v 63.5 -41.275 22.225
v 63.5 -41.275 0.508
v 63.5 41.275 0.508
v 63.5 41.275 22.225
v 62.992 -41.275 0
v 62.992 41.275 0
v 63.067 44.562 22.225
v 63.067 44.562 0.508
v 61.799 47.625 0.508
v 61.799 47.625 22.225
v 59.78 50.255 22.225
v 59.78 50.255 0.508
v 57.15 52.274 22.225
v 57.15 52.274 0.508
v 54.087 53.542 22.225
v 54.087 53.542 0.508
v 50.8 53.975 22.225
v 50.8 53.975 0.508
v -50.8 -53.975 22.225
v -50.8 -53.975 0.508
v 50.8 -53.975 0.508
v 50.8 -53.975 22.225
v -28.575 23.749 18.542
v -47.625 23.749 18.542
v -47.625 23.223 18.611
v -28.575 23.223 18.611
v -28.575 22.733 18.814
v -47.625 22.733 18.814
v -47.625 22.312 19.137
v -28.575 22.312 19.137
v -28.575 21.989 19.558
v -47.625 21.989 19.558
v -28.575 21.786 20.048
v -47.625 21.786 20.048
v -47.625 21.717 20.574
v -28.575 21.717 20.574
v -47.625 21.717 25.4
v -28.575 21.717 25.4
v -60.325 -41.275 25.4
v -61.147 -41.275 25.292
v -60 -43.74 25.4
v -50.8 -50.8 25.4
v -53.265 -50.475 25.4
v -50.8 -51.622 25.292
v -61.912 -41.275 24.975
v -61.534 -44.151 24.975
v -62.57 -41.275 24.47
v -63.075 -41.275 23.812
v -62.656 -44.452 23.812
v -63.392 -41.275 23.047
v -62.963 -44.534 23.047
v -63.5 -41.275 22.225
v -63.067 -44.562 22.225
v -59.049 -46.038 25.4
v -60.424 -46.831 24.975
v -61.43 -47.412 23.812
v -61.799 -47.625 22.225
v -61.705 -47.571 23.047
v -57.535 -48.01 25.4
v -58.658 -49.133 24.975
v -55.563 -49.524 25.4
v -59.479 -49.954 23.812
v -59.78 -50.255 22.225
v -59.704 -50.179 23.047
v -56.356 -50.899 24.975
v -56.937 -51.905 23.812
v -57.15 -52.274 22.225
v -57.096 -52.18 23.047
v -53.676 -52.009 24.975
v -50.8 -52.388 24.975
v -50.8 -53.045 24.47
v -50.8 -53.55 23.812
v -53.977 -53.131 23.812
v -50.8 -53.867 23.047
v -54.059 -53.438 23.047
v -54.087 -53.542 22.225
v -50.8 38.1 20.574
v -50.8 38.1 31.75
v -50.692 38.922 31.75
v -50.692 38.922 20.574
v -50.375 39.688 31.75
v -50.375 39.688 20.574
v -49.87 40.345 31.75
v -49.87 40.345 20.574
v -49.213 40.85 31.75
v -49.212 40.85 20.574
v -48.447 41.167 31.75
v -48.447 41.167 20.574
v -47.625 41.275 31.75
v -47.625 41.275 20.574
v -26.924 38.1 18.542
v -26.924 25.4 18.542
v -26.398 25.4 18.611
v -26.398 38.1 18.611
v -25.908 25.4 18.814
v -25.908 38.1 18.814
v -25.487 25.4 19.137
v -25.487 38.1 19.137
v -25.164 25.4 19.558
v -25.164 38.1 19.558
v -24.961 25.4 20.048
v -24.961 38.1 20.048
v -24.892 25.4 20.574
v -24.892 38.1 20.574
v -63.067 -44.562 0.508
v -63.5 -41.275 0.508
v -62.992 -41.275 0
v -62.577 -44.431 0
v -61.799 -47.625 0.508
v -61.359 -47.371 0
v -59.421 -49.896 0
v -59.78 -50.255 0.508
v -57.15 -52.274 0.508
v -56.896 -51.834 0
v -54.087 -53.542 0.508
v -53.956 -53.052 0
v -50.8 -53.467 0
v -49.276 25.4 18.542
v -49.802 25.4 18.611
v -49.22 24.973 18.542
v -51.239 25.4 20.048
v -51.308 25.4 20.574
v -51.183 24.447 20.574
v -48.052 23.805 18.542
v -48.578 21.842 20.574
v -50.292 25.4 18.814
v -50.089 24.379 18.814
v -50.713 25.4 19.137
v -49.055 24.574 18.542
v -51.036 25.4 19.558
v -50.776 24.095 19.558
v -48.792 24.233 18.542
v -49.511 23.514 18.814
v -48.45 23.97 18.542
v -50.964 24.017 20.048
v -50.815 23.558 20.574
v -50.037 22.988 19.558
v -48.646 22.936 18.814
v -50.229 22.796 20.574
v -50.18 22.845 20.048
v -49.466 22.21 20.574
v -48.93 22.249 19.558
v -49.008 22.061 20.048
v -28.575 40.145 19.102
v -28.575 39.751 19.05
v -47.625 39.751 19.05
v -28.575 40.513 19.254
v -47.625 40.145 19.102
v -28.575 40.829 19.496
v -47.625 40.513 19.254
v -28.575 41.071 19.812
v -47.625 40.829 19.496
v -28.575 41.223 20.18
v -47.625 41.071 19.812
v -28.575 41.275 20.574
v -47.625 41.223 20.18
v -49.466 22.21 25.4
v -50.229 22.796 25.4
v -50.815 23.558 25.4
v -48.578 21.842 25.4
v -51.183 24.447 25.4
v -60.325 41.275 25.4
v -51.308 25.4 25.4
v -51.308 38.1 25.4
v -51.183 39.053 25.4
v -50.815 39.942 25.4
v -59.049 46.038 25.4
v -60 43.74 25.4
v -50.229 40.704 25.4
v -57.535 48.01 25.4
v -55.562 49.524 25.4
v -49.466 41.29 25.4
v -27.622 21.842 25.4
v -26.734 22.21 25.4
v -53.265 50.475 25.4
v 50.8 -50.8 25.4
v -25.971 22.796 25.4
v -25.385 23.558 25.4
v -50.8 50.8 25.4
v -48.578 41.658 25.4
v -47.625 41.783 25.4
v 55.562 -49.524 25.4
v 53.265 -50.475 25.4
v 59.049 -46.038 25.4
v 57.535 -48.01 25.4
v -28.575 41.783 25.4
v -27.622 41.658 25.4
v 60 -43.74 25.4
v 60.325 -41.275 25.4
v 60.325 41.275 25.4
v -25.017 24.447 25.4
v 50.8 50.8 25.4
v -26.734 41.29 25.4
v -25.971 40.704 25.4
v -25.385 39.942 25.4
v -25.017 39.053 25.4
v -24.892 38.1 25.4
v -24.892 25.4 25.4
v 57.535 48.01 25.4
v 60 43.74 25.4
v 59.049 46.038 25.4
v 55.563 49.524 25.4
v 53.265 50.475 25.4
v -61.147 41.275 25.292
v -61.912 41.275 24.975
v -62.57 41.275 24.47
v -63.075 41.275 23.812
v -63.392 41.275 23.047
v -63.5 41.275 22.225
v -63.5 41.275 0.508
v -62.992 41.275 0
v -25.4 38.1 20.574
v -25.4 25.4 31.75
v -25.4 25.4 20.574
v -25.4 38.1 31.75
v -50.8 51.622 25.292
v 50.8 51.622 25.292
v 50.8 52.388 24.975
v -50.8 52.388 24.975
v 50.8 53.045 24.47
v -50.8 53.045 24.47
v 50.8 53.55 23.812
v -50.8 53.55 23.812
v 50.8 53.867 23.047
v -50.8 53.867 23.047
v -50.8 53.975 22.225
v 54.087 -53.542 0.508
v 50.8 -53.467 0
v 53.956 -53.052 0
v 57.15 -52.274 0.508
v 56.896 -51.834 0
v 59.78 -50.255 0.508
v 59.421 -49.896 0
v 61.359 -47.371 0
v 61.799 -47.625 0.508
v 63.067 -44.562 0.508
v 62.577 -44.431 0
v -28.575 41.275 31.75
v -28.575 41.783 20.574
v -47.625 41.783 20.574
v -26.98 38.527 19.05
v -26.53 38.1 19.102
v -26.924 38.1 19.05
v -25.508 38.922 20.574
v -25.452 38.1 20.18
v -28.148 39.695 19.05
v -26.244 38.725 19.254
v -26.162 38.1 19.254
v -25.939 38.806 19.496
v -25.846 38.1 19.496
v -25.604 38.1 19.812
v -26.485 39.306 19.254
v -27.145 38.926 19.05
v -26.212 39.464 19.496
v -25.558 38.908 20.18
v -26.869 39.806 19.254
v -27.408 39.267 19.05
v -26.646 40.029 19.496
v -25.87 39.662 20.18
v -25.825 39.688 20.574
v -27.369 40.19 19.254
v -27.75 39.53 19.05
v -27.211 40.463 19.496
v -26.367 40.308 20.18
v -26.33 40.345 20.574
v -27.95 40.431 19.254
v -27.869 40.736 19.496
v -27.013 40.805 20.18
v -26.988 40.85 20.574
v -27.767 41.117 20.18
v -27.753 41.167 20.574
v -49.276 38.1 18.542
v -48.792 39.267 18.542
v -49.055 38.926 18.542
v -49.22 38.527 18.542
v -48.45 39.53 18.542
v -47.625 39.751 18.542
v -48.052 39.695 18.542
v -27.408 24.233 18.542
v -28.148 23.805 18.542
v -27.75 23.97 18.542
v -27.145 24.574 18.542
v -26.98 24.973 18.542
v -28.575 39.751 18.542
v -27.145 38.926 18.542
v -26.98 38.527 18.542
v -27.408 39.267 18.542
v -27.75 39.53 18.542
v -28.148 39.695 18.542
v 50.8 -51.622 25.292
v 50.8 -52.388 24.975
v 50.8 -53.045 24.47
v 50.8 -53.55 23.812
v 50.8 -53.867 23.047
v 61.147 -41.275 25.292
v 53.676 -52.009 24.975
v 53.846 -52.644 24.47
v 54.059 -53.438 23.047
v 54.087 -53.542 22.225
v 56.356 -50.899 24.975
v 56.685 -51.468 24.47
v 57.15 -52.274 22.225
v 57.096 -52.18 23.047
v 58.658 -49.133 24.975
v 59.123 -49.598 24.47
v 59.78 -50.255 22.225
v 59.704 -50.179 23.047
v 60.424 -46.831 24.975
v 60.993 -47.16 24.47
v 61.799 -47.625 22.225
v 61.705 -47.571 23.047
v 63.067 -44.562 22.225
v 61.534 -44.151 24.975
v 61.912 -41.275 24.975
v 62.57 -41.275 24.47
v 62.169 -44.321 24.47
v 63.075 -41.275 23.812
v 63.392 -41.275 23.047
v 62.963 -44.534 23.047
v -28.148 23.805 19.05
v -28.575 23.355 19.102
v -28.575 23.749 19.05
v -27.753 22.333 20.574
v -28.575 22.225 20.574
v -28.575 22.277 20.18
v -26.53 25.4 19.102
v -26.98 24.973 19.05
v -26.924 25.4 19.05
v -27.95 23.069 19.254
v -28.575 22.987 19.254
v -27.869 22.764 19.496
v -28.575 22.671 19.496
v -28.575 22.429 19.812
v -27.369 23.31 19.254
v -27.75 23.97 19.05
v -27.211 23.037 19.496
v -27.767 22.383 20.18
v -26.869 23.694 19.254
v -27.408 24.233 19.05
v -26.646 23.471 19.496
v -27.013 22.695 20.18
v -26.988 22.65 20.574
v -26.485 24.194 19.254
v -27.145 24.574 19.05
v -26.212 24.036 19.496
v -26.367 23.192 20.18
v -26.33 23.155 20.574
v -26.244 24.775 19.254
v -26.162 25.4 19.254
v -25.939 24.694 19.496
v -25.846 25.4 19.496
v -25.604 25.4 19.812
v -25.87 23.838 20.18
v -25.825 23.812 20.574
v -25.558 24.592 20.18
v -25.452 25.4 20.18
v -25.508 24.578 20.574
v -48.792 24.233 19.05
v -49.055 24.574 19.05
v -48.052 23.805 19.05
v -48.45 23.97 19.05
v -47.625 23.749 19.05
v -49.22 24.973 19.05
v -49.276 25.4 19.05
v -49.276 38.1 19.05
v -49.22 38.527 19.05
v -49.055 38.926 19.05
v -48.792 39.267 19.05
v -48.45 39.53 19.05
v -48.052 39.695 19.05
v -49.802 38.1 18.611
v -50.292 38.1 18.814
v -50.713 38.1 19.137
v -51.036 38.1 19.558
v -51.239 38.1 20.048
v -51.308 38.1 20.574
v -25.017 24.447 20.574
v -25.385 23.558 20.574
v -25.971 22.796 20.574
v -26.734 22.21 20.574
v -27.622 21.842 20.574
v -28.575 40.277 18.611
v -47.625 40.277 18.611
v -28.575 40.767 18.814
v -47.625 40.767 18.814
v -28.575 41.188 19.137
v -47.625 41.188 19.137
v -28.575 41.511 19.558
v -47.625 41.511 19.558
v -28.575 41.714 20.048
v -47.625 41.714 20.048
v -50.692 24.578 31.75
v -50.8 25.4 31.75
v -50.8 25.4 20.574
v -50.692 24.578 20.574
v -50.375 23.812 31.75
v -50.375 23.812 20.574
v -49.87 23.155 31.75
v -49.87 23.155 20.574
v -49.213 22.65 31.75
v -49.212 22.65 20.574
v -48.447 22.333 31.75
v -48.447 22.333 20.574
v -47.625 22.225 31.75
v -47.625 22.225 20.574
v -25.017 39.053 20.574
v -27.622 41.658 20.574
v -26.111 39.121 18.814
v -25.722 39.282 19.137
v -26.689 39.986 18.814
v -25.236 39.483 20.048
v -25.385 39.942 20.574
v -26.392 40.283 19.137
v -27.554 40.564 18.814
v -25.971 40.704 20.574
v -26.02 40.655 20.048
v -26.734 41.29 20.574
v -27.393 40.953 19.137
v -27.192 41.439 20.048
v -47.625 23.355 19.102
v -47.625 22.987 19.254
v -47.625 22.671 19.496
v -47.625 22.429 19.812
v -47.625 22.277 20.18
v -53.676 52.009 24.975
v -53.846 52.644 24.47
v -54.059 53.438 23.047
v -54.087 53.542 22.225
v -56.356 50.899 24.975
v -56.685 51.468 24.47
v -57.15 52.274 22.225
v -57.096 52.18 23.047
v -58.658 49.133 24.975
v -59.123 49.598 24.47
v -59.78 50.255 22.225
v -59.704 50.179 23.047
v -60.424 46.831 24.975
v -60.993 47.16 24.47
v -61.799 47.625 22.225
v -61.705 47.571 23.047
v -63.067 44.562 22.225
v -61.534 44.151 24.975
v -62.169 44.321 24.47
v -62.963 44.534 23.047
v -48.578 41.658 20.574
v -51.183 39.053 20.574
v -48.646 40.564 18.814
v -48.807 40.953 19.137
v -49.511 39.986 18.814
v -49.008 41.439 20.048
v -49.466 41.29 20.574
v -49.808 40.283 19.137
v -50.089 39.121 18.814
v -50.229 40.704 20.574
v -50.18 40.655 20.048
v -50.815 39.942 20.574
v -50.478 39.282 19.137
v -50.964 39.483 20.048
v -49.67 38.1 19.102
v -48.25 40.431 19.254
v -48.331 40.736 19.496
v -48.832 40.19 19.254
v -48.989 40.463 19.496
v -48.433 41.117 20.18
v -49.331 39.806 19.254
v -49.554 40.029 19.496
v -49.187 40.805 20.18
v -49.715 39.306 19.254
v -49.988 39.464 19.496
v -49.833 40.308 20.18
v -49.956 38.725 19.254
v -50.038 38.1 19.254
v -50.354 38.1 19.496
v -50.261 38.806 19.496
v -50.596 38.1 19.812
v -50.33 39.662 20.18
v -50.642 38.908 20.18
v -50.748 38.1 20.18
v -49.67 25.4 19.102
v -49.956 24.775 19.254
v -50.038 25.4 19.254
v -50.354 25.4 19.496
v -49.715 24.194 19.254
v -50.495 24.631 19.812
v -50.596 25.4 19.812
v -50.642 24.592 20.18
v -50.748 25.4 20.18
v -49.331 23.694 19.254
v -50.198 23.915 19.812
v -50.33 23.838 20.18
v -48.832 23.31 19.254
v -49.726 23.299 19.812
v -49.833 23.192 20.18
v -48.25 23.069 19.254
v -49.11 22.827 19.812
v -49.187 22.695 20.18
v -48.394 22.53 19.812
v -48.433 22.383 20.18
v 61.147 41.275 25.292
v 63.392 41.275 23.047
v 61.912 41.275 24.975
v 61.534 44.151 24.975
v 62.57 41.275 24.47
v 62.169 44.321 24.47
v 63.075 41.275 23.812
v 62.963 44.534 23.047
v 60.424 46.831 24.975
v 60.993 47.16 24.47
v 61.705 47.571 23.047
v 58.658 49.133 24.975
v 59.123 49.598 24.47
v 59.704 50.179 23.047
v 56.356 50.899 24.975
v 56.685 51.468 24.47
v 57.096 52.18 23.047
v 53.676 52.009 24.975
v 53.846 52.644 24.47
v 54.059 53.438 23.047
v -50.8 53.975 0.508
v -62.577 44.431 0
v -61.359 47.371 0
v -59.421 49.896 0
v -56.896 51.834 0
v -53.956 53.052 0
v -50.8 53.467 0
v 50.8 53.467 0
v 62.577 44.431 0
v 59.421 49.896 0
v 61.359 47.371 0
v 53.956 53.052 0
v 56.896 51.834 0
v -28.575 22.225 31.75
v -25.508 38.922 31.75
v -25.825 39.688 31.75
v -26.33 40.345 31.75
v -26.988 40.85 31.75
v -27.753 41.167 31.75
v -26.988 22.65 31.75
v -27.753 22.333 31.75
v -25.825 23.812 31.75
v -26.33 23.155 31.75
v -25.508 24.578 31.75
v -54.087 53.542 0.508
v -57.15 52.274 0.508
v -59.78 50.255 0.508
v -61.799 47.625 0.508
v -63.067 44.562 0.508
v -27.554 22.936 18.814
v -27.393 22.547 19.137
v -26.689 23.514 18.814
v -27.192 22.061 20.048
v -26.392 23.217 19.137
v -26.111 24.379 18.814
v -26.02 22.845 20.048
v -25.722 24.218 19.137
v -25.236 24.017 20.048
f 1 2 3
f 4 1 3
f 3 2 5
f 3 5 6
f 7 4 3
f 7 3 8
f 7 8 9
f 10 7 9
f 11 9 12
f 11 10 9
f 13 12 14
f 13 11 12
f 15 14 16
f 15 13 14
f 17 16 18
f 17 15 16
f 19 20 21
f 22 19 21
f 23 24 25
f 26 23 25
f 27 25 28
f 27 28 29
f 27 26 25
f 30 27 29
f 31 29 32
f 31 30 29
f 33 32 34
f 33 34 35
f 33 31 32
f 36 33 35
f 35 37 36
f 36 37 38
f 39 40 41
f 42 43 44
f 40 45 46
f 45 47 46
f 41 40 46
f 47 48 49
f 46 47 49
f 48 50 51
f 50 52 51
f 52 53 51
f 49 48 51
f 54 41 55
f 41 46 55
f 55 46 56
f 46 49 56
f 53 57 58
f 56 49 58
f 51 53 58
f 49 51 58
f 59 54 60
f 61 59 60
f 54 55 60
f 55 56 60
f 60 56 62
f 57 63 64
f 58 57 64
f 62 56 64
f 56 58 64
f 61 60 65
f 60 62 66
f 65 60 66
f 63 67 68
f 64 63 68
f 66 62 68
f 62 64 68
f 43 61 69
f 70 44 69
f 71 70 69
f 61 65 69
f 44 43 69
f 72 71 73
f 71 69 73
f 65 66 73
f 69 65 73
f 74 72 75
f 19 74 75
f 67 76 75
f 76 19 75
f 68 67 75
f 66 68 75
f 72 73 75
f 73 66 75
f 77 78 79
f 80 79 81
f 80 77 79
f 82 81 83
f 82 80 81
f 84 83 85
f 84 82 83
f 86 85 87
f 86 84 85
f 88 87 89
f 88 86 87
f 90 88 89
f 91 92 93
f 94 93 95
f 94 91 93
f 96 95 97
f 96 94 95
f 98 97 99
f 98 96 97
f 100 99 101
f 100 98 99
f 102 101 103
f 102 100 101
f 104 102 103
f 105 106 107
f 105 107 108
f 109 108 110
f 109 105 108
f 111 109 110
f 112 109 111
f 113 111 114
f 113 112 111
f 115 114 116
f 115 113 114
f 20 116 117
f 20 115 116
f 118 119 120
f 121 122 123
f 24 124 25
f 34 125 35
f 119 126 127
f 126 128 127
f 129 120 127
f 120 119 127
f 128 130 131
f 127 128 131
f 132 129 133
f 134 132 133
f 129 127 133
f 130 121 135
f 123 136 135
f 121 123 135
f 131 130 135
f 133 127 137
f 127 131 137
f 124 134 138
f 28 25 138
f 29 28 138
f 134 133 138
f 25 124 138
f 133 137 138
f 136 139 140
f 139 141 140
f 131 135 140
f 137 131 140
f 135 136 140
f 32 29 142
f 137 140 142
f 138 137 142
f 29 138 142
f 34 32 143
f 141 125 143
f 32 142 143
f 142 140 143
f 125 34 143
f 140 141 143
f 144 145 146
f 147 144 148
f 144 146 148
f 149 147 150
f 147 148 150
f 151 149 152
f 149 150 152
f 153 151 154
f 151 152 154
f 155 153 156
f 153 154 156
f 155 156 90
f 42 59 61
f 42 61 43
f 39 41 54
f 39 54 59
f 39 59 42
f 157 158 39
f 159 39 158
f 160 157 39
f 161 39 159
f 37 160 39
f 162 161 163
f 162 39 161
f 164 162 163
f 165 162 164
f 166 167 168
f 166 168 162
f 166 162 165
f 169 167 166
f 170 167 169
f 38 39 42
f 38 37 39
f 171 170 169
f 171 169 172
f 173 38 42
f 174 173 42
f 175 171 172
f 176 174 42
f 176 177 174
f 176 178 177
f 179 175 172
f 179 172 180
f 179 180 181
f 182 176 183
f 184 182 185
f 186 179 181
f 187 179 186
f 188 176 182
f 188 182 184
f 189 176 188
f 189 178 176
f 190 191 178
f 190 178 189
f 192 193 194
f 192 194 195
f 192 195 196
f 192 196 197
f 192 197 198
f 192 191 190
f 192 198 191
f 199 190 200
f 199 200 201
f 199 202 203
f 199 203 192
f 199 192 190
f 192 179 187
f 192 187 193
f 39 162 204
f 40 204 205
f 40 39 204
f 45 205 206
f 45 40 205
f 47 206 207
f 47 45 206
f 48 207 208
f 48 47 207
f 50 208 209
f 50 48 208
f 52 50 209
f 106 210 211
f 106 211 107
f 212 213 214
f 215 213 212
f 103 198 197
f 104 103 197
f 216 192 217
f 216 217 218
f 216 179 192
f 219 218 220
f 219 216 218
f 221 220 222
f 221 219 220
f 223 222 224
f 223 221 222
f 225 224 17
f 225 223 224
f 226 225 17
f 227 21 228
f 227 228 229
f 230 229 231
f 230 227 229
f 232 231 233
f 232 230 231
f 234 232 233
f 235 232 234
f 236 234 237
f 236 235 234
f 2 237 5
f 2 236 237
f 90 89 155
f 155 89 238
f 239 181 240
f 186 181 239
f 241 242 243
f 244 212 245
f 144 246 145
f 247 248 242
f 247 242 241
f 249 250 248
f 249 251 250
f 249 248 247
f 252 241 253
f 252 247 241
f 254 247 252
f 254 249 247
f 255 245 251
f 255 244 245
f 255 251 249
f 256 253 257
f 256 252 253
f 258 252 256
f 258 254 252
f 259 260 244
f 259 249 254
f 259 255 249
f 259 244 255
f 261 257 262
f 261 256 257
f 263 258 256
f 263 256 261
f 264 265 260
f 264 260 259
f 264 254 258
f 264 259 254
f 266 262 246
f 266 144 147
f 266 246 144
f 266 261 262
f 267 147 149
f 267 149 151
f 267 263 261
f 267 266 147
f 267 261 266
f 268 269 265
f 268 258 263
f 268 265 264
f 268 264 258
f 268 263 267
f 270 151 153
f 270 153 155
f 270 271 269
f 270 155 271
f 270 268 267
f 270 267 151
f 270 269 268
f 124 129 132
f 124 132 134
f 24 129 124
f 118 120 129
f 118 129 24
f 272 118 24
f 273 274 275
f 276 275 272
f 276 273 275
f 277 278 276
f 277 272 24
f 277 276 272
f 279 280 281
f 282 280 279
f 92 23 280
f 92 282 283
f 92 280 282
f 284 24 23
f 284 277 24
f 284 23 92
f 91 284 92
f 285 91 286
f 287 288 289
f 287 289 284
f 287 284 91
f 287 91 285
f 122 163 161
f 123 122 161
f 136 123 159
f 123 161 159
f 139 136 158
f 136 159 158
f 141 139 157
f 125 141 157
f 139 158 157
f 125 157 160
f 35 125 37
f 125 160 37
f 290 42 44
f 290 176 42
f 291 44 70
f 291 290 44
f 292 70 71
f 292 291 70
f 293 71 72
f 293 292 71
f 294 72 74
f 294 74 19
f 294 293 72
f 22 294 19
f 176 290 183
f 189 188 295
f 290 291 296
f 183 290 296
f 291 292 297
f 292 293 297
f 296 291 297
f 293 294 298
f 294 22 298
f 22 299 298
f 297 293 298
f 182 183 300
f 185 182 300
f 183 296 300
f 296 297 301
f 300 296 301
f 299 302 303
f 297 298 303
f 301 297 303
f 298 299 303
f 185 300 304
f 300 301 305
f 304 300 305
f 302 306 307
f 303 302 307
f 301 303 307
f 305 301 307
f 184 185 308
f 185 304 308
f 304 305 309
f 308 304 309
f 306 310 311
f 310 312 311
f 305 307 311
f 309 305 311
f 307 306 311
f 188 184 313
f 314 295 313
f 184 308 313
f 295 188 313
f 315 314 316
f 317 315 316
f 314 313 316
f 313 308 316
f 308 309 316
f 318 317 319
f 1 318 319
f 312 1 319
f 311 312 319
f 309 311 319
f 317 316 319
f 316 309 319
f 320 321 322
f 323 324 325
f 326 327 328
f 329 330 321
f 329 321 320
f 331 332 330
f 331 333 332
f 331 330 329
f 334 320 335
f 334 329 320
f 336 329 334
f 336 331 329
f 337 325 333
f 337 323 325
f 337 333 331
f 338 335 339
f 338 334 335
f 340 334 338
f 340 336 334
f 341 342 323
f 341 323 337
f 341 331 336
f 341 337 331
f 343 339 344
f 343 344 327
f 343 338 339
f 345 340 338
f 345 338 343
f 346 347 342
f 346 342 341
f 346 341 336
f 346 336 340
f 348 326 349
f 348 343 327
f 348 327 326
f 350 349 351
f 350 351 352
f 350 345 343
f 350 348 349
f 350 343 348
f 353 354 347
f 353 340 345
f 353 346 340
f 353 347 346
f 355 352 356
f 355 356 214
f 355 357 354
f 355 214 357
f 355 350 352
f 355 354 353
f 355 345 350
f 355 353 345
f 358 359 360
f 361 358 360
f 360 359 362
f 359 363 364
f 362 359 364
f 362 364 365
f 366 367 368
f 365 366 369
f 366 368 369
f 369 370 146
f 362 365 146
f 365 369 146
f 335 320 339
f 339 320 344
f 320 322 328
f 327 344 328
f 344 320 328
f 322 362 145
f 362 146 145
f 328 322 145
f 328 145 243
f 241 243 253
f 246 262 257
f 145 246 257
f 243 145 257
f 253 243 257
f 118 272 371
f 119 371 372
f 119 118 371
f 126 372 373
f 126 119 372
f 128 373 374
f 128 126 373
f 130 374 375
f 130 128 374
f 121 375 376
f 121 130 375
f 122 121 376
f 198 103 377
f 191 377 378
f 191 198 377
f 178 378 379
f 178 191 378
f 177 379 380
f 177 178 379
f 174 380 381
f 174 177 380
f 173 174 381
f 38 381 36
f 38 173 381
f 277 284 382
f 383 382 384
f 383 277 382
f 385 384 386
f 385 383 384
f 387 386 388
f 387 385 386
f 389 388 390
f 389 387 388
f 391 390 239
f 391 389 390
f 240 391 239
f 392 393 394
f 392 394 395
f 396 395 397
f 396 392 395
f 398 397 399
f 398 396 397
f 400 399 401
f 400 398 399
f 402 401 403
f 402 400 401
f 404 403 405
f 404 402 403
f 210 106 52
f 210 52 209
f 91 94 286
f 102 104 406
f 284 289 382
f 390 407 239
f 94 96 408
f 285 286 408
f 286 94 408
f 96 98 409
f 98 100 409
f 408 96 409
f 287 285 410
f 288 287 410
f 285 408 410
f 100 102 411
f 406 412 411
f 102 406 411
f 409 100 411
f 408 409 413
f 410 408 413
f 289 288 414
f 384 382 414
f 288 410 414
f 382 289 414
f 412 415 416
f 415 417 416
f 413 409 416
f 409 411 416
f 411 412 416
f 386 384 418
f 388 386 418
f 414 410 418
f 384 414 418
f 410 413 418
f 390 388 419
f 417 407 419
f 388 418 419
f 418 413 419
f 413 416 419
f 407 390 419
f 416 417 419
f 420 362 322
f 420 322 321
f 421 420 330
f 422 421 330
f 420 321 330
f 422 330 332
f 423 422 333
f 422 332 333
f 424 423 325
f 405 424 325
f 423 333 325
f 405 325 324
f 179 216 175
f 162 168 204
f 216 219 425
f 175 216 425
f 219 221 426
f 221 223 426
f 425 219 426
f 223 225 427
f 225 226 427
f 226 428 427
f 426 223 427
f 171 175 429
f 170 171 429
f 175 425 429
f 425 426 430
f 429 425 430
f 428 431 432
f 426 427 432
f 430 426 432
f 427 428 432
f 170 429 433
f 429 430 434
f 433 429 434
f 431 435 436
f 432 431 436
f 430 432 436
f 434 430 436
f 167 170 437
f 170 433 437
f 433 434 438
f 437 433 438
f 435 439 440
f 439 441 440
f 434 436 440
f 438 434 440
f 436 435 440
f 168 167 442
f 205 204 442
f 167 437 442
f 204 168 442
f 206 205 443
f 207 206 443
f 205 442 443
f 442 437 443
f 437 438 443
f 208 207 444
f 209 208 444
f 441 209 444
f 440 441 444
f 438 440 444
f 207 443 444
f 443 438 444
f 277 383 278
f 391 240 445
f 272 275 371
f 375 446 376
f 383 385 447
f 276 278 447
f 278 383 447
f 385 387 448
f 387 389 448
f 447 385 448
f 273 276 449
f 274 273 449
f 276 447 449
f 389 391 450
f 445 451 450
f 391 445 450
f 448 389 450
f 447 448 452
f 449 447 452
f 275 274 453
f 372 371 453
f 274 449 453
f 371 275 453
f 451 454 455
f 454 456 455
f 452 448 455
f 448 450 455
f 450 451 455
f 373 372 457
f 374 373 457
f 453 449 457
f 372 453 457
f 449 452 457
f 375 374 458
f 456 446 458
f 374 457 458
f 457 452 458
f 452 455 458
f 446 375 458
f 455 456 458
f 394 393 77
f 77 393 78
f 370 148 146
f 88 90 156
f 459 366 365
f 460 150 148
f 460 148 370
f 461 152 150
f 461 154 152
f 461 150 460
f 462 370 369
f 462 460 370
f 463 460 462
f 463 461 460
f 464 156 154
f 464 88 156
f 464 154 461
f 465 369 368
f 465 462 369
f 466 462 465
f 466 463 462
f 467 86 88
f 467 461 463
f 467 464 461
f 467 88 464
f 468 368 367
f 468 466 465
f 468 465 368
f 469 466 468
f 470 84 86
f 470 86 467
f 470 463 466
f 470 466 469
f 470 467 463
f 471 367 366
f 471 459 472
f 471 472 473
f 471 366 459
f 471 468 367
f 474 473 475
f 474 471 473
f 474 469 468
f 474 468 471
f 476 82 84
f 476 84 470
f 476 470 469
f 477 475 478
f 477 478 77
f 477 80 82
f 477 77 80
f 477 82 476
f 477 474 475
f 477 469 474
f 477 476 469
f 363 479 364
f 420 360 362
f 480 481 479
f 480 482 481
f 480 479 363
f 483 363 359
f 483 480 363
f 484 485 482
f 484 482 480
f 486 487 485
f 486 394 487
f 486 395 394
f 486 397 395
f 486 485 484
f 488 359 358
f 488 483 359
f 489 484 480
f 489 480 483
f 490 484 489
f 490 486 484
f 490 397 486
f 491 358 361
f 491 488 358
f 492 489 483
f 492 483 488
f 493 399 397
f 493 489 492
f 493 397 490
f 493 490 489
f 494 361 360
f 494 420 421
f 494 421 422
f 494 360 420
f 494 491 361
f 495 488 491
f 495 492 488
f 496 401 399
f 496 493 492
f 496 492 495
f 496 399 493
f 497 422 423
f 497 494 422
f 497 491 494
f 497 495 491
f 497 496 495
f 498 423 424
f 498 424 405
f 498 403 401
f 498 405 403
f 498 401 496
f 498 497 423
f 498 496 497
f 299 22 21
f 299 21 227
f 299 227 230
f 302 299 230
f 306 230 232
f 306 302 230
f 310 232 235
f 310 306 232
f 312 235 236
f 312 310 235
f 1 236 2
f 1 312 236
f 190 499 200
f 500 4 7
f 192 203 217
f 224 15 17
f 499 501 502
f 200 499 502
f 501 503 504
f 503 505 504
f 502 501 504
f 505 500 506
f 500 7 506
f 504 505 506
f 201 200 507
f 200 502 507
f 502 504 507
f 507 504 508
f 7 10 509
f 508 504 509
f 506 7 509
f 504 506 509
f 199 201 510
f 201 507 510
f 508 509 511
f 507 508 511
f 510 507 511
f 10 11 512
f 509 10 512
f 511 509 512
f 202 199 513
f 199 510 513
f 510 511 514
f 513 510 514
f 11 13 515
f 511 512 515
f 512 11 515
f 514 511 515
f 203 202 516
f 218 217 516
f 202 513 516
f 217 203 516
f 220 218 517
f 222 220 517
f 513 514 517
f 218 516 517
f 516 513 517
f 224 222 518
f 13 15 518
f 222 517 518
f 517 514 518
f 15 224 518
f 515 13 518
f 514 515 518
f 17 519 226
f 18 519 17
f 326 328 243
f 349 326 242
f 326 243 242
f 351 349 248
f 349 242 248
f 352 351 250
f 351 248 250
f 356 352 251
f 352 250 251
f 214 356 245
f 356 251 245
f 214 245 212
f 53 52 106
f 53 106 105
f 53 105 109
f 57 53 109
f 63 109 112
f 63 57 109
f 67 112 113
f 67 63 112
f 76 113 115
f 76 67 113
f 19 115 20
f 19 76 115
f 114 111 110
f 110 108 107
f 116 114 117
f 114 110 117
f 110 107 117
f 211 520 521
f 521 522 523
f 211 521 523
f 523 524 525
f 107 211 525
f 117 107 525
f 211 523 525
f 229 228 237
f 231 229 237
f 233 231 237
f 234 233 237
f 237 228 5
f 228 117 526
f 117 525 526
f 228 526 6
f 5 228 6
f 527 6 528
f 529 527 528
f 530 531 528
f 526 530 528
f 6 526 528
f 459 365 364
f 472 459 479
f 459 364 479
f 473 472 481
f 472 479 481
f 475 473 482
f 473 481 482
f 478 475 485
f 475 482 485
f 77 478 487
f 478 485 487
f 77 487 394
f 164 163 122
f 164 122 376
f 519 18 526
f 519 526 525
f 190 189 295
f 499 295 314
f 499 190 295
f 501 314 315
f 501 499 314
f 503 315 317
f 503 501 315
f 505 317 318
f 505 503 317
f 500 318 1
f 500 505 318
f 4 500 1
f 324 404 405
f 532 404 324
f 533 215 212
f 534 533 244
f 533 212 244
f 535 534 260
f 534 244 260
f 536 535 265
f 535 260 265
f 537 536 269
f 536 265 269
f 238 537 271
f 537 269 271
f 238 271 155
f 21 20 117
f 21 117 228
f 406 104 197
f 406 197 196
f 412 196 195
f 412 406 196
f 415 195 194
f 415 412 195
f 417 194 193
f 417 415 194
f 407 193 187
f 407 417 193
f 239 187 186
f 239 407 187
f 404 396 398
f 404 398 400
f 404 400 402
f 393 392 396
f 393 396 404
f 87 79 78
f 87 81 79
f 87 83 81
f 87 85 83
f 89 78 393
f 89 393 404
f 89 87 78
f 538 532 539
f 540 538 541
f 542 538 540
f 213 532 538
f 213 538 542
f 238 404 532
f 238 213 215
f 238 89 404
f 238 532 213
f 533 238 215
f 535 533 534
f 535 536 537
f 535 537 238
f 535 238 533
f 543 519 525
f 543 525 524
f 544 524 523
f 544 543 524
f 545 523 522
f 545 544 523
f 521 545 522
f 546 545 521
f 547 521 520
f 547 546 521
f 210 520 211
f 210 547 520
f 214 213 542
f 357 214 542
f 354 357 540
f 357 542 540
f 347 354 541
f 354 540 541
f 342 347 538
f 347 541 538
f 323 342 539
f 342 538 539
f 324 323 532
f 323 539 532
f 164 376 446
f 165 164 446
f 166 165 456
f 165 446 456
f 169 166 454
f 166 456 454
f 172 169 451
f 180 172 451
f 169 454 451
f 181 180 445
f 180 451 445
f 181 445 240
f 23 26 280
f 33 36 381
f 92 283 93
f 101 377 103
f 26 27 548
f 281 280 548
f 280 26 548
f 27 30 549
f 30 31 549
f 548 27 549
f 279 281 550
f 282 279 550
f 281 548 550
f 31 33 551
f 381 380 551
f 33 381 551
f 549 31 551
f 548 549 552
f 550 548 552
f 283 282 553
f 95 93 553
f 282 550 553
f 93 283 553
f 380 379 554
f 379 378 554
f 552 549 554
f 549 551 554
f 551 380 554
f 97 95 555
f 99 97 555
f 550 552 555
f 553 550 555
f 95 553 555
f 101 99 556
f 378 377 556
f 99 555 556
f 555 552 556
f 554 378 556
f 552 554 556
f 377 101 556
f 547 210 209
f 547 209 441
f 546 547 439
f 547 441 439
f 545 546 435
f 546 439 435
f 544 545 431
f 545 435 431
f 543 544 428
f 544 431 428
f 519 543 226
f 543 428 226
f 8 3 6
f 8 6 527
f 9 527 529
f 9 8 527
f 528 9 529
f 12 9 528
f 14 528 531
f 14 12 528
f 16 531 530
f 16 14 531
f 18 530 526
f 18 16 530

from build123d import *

# Parameters (mm, degrees)
F0_W      = 127
F0_H      = 107.95
F1_DEPTH  = 25.4
F2_W      = 25.4
F2_H      = 19.05
F3_DEPTH  = 6.35
F4_R      = 3.175
F5_R      = 1.524
F6_R      = 12.7
F7_R      = 3.175
F8_SIZE   = 0.508
F9_OFFSET = 0.508


with BuildPart() as f1:
    # F0 (on Top) → F1 (new body)
    with BuildSketch(Plane.XY):
        Rectangle(F0_W, F0_H)
    extrude(amount=F1_DEPTH)

    # F6
    f6_edges = [f1.edges().sort_by_distance(p)[0] for p in [
        (63.5, -53.975, 12.7),
        (63.5, 53.975, 12.7),
        (-63.5, 53.975, 12.7),
        (-63.5, -53.975, 12.7),
    ]]
    fillet(f6_edges, radius=F6_R)

    # F7
    f7_edges = [f1.edges().sort_by_distance(p)[0] for p in [
        (0, -53.975, 25.4),
    ]]
    fillet(f7_edges, radius=F7_R)

    # F8
    f8_edges = [f1.edges().sort_by_distance(p)[0] for p in [
        (0, -53.975, 0),
    ]]
    chamfer(f8_edges, length=F8_SIZE)


with BuildPart() as f3:
    # F2 (on face) → F3 (new body, symmetric)
    with BuildSketch(Plane.XY.offset(25.4)):
        with Locations((-38.1, 31.75)):
            Rectangle(F2_W, F2_H)
    extrude(amount=F3_DEPTH, both=True)

    # F4
    f4_edges = [f3.edges().sort_by_distance(p)[0] for p in [
        (-25.4, 41.275, 25.4),
        (-25.4, 22.225, 25.4),
        (-50.8, 22.225, 25.4),
        (-50.8, 41.275, 25.4),
    ]]
    fillet(f4_edges, radius=F4_R)

    # F5
    f5_edges = [f3.edges().sort_by_distance(p)[0] for p in [
        (-38.1, 22.225, 19.05),
    ]]
    fillet(f5_edges, radius=F5_R)


with BuildPart() as f1_1:
    add(f1.part)

    # F9: cut F3, made larger all round first
    f9_tool = offset(f3.part, amount=F9_OFFSET, kind=Kind.INTERSECTION, mode=Mode.PRIVATE)
    add(f9_tool, mode=Mode.SUBTRACT)


solid = Compound([f3.part, f1_1.part])
